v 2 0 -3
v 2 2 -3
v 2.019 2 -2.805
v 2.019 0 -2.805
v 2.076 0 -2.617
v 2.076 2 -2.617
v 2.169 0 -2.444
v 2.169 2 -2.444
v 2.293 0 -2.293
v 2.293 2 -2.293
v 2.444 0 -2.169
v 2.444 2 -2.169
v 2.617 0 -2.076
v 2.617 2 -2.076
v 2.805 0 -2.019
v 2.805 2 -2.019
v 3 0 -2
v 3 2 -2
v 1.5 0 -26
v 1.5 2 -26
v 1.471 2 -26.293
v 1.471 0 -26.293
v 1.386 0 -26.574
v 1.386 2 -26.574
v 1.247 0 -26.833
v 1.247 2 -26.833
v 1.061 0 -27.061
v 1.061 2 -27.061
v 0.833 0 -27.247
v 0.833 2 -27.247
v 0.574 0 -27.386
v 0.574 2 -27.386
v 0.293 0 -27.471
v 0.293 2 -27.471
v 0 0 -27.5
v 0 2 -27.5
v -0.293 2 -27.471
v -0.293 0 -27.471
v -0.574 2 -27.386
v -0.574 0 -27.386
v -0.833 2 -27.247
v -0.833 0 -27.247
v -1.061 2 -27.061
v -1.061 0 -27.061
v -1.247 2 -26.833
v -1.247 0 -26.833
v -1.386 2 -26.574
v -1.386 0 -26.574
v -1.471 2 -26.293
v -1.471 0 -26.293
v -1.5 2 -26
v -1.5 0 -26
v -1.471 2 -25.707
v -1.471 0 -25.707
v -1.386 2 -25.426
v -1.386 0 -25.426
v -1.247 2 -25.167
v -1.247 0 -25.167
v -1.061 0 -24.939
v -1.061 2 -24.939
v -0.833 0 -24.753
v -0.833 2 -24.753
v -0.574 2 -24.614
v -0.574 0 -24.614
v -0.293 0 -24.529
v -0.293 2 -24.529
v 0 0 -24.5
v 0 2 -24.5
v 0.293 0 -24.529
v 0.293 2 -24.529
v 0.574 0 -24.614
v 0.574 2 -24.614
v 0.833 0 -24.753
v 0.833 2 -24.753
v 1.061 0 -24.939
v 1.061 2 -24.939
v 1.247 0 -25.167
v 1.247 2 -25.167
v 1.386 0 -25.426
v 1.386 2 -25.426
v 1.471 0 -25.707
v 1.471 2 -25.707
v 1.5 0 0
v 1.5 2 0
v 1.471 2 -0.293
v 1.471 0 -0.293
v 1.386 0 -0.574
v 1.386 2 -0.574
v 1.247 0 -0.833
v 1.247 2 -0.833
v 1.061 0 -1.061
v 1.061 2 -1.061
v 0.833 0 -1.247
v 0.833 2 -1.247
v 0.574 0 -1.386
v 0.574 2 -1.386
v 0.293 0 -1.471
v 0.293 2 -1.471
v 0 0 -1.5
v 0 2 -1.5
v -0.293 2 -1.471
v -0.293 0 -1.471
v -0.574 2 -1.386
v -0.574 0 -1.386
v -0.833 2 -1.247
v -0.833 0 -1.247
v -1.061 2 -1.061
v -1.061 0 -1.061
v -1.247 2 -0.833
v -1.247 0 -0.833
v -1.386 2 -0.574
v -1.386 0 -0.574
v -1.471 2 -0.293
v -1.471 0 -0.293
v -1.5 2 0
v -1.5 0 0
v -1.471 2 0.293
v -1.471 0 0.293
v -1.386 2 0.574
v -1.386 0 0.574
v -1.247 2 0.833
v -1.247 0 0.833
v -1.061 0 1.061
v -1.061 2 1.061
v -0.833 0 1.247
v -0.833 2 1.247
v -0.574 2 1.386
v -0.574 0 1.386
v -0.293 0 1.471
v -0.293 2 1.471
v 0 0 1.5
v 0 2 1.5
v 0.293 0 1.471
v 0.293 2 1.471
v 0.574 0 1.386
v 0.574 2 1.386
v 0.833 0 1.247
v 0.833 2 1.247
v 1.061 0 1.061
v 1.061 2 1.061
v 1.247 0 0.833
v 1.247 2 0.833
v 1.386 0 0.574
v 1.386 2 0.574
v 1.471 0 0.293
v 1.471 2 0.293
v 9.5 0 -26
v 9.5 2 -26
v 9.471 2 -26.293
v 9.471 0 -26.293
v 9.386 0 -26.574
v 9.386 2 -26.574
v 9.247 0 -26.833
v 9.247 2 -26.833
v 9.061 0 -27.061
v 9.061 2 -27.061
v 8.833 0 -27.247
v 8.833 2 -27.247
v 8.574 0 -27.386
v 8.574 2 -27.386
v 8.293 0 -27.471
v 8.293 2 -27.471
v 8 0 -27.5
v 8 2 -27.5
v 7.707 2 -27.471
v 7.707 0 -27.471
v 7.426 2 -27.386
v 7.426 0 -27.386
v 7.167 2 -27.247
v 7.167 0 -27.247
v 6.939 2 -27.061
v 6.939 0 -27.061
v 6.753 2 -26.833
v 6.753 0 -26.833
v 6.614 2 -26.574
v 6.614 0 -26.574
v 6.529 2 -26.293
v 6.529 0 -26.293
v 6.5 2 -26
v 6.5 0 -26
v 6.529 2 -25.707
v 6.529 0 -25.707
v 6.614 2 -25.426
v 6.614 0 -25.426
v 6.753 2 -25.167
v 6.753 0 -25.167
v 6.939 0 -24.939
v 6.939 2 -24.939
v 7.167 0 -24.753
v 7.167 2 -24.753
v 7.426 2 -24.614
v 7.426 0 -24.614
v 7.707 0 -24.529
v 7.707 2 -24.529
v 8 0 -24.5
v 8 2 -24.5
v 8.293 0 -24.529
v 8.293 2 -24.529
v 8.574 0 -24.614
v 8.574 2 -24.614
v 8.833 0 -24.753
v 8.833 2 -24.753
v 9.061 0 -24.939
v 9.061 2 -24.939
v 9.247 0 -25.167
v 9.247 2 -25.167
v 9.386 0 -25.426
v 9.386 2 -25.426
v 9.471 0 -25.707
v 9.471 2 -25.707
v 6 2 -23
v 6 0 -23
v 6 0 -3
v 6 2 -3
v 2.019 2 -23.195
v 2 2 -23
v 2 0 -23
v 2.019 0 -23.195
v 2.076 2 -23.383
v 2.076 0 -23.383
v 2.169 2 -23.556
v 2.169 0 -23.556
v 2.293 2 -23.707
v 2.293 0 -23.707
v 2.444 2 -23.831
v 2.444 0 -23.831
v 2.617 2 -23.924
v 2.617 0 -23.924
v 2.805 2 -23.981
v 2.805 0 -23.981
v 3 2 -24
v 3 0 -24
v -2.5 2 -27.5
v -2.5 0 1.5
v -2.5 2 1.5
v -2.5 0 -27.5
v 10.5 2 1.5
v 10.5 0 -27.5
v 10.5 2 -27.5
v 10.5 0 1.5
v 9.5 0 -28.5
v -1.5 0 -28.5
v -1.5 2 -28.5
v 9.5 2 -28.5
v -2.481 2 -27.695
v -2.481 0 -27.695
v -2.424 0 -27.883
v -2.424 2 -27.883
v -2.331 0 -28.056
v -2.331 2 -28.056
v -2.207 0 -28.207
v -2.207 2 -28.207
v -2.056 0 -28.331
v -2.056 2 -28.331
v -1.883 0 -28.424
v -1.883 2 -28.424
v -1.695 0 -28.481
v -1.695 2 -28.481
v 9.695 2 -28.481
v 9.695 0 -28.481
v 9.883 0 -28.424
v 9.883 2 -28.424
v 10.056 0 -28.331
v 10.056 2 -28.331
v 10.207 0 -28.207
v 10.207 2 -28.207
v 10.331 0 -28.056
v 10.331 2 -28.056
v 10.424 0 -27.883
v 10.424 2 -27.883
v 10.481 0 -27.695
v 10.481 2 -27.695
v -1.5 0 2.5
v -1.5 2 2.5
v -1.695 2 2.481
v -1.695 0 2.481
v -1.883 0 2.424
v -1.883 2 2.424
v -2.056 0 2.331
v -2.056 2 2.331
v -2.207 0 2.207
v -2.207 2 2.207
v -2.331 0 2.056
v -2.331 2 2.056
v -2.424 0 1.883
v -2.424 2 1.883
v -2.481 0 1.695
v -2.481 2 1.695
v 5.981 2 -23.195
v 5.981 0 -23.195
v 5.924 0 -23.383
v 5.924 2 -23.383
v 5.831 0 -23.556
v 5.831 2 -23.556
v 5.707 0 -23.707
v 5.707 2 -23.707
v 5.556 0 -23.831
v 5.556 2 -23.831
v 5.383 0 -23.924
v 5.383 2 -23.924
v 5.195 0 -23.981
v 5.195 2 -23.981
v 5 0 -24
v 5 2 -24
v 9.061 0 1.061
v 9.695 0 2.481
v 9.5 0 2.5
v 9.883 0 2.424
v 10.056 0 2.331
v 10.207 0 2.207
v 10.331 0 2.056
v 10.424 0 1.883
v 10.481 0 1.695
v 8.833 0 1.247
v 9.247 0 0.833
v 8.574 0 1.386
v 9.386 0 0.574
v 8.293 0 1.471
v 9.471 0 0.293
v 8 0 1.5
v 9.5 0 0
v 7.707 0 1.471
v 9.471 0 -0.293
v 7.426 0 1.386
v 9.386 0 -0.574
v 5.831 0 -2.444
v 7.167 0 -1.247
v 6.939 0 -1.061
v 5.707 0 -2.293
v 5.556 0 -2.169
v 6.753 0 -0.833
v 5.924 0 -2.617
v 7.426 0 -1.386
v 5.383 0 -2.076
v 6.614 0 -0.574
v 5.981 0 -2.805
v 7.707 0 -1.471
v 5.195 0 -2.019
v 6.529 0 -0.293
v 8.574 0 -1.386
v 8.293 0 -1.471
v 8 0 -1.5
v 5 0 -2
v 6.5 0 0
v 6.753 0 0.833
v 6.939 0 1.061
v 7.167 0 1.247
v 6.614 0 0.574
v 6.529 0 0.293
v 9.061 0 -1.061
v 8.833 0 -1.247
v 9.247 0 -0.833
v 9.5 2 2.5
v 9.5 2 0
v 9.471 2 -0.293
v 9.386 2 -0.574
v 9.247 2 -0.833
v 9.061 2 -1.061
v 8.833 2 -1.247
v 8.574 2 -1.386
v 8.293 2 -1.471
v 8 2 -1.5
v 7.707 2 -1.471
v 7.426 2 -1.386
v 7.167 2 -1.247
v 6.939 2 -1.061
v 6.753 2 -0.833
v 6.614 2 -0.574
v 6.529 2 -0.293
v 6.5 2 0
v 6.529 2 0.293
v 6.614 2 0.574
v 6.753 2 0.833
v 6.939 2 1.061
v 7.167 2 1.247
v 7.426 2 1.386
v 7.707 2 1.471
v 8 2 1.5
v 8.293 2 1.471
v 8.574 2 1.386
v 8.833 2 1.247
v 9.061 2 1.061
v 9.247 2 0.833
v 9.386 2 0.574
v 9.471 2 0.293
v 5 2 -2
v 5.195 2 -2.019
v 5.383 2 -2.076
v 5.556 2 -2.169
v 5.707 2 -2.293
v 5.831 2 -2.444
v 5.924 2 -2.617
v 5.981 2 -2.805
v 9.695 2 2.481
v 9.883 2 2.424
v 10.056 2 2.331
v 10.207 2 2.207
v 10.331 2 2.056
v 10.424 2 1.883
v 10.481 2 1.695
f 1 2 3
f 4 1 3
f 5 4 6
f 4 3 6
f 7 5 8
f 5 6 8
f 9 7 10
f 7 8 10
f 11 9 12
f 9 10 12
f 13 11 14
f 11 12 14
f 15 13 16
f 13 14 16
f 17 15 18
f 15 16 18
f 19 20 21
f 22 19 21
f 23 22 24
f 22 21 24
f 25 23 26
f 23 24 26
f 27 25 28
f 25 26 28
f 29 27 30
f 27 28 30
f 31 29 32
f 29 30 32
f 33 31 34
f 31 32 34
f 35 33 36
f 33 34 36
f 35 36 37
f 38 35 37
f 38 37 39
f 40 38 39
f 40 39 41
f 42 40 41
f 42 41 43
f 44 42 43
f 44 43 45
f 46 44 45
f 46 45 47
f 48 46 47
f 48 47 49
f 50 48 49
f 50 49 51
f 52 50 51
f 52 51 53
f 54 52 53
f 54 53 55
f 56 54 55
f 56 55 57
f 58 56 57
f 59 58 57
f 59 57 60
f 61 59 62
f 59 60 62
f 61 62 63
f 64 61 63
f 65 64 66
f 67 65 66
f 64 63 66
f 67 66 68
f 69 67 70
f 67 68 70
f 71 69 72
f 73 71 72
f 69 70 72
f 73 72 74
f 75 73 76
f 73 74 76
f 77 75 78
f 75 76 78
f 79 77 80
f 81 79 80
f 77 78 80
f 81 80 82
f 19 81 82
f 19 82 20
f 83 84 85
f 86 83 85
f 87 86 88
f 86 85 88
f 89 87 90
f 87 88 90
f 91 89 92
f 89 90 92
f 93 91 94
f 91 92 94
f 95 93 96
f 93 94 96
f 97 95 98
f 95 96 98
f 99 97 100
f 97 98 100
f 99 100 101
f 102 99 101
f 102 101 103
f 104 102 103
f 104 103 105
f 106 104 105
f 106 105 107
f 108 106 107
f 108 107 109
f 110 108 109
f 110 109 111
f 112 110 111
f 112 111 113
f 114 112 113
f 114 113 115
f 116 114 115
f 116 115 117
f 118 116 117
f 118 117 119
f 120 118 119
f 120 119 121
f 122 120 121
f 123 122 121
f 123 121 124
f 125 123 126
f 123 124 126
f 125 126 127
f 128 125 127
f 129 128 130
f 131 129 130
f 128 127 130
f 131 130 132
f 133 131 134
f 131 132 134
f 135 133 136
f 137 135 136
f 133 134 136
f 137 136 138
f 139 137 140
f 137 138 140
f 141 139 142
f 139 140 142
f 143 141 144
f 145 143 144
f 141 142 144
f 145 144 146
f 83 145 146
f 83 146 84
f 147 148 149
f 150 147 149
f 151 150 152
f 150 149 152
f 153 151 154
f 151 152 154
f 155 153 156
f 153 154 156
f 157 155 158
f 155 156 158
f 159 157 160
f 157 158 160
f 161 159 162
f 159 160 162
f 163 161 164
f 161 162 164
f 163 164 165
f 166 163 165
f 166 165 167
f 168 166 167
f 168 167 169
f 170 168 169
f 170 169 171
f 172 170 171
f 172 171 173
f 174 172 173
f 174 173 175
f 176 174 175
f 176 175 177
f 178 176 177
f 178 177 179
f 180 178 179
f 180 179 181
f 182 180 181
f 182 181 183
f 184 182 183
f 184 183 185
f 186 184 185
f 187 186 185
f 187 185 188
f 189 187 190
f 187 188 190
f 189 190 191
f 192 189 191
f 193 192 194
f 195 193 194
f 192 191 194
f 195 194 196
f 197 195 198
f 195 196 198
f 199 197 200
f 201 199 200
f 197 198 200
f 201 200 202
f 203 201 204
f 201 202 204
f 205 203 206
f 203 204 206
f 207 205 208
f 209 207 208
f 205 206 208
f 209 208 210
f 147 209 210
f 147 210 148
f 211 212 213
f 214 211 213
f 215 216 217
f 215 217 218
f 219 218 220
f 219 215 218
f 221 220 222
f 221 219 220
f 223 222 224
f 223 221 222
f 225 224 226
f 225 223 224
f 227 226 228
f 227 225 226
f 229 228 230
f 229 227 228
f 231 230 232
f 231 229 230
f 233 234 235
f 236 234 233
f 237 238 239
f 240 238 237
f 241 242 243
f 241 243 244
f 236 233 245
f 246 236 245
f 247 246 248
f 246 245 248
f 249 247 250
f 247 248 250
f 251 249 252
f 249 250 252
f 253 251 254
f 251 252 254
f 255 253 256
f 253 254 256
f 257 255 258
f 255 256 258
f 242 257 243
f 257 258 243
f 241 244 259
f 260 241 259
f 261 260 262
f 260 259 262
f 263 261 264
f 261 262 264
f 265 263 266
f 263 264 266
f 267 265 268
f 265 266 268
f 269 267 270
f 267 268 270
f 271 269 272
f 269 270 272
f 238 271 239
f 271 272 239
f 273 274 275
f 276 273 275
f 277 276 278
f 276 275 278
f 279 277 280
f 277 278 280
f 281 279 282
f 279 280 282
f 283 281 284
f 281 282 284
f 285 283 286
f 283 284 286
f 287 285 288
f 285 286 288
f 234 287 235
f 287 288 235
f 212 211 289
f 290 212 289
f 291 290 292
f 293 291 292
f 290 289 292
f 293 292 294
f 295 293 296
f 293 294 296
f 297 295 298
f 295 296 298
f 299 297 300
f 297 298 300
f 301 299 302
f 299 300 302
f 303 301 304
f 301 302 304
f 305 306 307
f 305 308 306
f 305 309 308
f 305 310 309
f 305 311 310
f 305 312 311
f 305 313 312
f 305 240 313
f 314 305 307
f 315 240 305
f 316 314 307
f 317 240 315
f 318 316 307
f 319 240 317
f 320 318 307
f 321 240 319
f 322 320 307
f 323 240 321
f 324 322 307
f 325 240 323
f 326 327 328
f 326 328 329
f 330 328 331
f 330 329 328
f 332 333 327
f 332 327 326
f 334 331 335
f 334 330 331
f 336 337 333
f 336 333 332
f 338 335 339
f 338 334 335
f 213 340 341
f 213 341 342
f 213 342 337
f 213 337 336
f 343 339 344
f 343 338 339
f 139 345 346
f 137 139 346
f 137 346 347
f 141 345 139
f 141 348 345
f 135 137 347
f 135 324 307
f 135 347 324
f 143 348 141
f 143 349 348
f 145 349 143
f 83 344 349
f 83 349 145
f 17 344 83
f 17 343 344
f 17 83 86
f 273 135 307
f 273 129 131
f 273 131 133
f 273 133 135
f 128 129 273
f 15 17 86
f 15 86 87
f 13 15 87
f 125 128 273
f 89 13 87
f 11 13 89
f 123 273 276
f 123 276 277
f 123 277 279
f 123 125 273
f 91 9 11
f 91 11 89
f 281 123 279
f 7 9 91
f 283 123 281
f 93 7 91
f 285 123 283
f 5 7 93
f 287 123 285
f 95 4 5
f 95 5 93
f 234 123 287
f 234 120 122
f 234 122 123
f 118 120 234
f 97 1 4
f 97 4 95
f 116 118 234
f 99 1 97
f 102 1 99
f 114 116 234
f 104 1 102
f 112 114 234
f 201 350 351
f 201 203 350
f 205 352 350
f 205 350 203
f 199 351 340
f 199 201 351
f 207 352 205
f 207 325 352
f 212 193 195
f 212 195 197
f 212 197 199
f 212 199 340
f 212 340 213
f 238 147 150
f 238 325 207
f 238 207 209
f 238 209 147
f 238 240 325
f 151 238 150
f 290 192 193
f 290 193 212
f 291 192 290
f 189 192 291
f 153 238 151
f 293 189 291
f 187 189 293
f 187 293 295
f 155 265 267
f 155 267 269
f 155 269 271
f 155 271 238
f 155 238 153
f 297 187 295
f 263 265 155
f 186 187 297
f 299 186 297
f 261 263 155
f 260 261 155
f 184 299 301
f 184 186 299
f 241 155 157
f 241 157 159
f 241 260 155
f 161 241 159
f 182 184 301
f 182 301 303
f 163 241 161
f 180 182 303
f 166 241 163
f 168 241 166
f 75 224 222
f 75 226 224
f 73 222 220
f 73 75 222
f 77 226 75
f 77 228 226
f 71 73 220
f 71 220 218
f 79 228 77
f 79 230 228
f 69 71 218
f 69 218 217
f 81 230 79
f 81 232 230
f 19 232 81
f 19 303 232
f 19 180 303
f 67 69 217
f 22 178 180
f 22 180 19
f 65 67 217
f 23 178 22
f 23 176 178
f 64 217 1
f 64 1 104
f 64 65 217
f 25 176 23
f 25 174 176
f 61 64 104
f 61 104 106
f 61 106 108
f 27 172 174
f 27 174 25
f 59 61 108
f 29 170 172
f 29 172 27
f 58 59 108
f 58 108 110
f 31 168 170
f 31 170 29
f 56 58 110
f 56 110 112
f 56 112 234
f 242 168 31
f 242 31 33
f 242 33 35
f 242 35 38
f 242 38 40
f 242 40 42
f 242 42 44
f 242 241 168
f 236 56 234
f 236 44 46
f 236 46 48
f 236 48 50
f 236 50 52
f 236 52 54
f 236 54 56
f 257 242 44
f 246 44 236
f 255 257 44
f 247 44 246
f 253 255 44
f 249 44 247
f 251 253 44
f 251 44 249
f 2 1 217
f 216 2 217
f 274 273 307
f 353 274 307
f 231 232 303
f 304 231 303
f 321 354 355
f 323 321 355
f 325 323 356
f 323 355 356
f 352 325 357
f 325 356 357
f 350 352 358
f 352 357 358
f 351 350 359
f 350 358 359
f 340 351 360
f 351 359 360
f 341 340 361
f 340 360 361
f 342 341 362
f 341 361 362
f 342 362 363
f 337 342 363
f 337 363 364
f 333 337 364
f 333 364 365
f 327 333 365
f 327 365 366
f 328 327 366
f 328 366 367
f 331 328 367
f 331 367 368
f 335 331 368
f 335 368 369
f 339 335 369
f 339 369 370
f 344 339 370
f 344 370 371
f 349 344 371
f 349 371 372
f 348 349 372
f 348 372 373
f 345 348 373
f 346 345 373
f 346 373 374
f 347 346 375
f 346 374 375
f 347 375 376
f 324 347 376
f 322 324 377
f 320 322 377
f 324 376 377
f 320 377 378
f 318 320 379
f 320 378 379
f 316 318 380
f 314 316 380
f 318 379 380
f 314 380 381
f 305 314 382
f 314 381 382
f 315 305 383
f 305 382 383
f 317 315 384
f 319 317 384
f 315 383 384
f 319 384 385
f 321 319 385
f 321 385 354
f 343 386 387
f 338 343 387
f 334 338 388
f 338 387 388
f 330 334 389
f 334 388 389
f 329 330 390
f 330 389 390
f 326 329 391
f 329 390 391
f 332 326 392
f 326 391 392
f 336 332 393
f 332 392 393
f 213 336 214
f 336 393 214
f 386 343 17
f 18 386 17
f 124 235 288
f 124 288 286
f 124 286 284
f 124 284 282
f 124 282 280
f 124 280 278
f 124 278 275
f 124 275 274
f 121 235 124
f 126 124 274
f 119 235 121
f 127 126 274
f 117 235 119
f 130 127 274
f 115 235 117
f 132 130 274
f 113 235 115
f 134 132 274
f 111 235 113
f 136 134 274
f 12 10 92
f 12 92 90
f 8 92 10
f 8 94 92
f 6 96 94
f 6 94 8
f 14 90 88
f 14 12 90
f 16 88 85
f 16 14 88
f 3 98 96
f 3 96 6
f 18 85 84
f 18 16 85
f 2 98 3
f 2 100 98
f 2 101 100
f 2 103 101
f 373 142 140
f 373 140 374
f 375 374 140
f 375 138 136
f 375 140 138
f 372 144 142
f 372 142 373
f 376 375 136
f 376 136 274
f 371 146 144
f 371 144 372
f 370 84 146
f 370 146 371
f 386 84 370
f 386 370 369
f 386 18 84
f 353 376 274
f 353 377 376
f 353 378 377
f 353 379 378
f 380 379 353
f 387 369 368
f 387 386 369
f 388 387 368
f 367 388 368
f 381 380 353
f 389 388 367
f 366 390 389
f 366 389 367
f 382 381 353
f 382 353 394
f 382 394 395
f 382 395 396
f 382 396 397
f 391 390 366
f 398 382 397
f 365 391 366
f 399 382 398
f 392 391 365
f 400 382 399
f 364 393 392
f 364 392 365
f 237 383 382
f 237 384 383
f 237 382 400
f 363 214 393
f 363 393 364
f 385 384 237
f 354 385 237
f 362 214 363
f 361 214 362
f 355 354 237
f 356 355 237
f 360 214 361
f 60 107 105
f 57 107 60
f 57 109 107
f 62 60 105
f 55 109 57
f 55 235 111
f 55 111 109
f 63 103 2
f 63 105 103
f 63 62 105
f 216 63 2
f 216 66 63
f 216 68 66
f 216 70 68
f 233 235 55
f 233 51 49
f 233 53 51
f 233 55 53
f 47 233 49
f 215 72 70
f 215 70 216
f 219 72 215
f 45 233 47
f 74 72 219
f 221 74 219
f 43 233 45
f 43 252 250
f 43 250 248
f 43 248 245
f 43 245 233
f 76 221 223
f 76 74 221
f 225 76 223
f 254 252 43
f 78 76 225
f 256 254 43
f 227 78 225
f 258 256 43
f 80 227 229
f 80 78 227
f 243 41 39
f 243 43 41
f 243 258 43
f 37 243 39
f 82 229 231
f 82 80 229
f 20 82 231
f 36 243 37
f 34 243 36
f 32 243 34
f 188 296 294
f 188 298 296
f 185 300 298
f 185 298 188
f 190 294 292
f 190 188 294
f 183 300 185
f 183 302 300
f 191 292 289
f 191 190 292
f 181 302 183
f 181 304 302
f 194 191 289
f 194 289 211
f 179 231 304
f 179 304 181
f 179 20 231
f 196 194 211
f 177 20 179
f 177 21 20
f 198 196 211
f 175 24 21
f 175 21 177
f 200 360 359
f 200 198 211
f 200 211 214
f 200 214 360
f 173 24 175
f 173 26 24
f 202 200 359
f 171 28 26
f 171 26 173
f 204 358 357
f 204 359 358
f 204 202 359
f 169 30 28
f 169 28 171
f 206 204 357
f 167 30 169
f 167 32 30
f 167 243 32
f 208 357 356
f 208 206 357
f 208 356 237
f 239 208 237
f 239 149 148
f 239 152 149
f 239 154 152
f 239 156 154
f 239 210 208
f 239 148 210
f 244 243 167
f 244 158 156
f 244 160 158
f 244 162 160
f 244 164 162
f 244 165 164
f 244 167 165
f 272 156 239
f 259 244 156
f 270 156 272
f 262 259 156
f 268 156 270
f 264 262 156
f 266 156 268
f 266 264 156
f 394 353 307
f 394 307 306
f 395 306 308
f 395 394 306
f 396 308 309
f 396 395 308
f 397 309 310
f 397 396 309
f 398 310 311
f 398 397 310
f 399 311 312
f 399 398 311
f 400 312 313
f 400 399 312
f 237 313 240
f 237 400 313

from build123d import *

# Parameters (mm, degrees)
SKETCH1_R           = 1.4
BOSS_EXTRUDE2_DEPTH = 5.5
FILLET2_R           = 1
SKETCH2_R           = 1.5
CUT_EXTRUDE1_DEPTH  = 10
SKETCH3_R           = 36.045042524
CUT_EXTRUDE2_DEPTH  = 0.5
SKETCH4_R           = 41.346922652
CUT_EXTRUDE3_DEPTH  = 1
SKETCH5_R           = 64.87410788
CUT_EXTRUDE4_DEPTH  = 2


with BuildPart() as part:
    # Sketch1 → Boss-Extrude2 (new body)
    with BuildSketch(Plane(origin=(0, 0, 0), x_dir=(1, 0, 0), z_dir=(0, 1, 0))):
        Polygon((4, -2.5), (-2.5, -2.5), (-2.5, 28.5), (10.5, 28.5), (10.5, -2.5), align=None)
        with Locations((8, 26)):
            Circle(SKETCH1_R, mode=Mode.SUBTRACT)
        with Locations((0, 26)):
            Circle(SKETCH1_R, mode=Mode.SUBTRACT)
        with Locations((8, 0)):
            Circle(SKETCH1_R, mode=Mode.SUBTRACT)
        Circle(SKETCH1_R, mode=Mode.SUBTRACT)
        Polygon((4, 2), (2, 2), (2, 24), (6, 24), (6, 2), align=None, mode=Mode.SUBTRACT)
    extrude(amount=BOSS_EXTRUDE2_DEPTH)

    # Fillet2
    fillet2_edges = [part.edges().sort_by_distance(p)[0] for p in [
        (6, 2.75, -24),
        (2, 2.75, -24),
        (2, 2.75, -2),
        (6, 2.75, -2),
        (-2.5, 2.75, 2.5),
        (-2.5, 2.75, -28.5),
        (10.5, 2.75, -28.5),
        (10.5, 2.75, 2.5),
    ]]
    fillet(fillet2_edges, radius=FILLET2_R)

    # Sketch2 → Cut-Extrude1 (cut)
    with BuildSketch(Plane(origin=(0, 5.5, 0), x_dir=(1, 0, 0), z_dir=(0, 1, 0))):
        with Locations((0, 26)):
            Circle(SKETCH2_R)
        with Locations((8, 26)):
            Circle(SKETCH2_R)
        with Locations((8, 0)):
            Circle(SKETCH2_R)
        Circle(SKETCH2_R)
    extrude(amount=-CUT_EXTRUDE1_DEPTH, mode=Mode.SUBTRACT)

    # Sketch3 → Cut-Extrude2 (cut)
    with BuildSketch(Plane(origin=(0, 5.5, 0), x_dir=(1, 0, 0), z_dir=(0, 1, 0))):
        Circle(SKETCH3_R)
    extrude(amount=-CUT_EXTRUDE2_DEPTH, mode=Mode.SUBTRACT)

    # Sketch4 → Cut-Extrude3 (cut)
    with BuildSketch(Plane(origin=(0, 5, 0), x_dir=(1, 0, 0), z_dir=(0, 1, 0))):
        Circle(SKETCH4_R)
    extrude(amount=-CUT_EXTRUDE3_DEPTH, mode=Mode.SUBTRACT)

    # Sketch5 → Cut-Extrude4 (cut)
    with BuildSketch(Plane(origin=(0, 4, 0), x_dir=(1, 0, 0), z_dir=(0, 1, 0))):
        Circle(SKETCH5_R)
    extrude(amount=-CUT_EXTRUDE4_DEPTH, mode=Mode.SUBTRACT)


solid = part.part
